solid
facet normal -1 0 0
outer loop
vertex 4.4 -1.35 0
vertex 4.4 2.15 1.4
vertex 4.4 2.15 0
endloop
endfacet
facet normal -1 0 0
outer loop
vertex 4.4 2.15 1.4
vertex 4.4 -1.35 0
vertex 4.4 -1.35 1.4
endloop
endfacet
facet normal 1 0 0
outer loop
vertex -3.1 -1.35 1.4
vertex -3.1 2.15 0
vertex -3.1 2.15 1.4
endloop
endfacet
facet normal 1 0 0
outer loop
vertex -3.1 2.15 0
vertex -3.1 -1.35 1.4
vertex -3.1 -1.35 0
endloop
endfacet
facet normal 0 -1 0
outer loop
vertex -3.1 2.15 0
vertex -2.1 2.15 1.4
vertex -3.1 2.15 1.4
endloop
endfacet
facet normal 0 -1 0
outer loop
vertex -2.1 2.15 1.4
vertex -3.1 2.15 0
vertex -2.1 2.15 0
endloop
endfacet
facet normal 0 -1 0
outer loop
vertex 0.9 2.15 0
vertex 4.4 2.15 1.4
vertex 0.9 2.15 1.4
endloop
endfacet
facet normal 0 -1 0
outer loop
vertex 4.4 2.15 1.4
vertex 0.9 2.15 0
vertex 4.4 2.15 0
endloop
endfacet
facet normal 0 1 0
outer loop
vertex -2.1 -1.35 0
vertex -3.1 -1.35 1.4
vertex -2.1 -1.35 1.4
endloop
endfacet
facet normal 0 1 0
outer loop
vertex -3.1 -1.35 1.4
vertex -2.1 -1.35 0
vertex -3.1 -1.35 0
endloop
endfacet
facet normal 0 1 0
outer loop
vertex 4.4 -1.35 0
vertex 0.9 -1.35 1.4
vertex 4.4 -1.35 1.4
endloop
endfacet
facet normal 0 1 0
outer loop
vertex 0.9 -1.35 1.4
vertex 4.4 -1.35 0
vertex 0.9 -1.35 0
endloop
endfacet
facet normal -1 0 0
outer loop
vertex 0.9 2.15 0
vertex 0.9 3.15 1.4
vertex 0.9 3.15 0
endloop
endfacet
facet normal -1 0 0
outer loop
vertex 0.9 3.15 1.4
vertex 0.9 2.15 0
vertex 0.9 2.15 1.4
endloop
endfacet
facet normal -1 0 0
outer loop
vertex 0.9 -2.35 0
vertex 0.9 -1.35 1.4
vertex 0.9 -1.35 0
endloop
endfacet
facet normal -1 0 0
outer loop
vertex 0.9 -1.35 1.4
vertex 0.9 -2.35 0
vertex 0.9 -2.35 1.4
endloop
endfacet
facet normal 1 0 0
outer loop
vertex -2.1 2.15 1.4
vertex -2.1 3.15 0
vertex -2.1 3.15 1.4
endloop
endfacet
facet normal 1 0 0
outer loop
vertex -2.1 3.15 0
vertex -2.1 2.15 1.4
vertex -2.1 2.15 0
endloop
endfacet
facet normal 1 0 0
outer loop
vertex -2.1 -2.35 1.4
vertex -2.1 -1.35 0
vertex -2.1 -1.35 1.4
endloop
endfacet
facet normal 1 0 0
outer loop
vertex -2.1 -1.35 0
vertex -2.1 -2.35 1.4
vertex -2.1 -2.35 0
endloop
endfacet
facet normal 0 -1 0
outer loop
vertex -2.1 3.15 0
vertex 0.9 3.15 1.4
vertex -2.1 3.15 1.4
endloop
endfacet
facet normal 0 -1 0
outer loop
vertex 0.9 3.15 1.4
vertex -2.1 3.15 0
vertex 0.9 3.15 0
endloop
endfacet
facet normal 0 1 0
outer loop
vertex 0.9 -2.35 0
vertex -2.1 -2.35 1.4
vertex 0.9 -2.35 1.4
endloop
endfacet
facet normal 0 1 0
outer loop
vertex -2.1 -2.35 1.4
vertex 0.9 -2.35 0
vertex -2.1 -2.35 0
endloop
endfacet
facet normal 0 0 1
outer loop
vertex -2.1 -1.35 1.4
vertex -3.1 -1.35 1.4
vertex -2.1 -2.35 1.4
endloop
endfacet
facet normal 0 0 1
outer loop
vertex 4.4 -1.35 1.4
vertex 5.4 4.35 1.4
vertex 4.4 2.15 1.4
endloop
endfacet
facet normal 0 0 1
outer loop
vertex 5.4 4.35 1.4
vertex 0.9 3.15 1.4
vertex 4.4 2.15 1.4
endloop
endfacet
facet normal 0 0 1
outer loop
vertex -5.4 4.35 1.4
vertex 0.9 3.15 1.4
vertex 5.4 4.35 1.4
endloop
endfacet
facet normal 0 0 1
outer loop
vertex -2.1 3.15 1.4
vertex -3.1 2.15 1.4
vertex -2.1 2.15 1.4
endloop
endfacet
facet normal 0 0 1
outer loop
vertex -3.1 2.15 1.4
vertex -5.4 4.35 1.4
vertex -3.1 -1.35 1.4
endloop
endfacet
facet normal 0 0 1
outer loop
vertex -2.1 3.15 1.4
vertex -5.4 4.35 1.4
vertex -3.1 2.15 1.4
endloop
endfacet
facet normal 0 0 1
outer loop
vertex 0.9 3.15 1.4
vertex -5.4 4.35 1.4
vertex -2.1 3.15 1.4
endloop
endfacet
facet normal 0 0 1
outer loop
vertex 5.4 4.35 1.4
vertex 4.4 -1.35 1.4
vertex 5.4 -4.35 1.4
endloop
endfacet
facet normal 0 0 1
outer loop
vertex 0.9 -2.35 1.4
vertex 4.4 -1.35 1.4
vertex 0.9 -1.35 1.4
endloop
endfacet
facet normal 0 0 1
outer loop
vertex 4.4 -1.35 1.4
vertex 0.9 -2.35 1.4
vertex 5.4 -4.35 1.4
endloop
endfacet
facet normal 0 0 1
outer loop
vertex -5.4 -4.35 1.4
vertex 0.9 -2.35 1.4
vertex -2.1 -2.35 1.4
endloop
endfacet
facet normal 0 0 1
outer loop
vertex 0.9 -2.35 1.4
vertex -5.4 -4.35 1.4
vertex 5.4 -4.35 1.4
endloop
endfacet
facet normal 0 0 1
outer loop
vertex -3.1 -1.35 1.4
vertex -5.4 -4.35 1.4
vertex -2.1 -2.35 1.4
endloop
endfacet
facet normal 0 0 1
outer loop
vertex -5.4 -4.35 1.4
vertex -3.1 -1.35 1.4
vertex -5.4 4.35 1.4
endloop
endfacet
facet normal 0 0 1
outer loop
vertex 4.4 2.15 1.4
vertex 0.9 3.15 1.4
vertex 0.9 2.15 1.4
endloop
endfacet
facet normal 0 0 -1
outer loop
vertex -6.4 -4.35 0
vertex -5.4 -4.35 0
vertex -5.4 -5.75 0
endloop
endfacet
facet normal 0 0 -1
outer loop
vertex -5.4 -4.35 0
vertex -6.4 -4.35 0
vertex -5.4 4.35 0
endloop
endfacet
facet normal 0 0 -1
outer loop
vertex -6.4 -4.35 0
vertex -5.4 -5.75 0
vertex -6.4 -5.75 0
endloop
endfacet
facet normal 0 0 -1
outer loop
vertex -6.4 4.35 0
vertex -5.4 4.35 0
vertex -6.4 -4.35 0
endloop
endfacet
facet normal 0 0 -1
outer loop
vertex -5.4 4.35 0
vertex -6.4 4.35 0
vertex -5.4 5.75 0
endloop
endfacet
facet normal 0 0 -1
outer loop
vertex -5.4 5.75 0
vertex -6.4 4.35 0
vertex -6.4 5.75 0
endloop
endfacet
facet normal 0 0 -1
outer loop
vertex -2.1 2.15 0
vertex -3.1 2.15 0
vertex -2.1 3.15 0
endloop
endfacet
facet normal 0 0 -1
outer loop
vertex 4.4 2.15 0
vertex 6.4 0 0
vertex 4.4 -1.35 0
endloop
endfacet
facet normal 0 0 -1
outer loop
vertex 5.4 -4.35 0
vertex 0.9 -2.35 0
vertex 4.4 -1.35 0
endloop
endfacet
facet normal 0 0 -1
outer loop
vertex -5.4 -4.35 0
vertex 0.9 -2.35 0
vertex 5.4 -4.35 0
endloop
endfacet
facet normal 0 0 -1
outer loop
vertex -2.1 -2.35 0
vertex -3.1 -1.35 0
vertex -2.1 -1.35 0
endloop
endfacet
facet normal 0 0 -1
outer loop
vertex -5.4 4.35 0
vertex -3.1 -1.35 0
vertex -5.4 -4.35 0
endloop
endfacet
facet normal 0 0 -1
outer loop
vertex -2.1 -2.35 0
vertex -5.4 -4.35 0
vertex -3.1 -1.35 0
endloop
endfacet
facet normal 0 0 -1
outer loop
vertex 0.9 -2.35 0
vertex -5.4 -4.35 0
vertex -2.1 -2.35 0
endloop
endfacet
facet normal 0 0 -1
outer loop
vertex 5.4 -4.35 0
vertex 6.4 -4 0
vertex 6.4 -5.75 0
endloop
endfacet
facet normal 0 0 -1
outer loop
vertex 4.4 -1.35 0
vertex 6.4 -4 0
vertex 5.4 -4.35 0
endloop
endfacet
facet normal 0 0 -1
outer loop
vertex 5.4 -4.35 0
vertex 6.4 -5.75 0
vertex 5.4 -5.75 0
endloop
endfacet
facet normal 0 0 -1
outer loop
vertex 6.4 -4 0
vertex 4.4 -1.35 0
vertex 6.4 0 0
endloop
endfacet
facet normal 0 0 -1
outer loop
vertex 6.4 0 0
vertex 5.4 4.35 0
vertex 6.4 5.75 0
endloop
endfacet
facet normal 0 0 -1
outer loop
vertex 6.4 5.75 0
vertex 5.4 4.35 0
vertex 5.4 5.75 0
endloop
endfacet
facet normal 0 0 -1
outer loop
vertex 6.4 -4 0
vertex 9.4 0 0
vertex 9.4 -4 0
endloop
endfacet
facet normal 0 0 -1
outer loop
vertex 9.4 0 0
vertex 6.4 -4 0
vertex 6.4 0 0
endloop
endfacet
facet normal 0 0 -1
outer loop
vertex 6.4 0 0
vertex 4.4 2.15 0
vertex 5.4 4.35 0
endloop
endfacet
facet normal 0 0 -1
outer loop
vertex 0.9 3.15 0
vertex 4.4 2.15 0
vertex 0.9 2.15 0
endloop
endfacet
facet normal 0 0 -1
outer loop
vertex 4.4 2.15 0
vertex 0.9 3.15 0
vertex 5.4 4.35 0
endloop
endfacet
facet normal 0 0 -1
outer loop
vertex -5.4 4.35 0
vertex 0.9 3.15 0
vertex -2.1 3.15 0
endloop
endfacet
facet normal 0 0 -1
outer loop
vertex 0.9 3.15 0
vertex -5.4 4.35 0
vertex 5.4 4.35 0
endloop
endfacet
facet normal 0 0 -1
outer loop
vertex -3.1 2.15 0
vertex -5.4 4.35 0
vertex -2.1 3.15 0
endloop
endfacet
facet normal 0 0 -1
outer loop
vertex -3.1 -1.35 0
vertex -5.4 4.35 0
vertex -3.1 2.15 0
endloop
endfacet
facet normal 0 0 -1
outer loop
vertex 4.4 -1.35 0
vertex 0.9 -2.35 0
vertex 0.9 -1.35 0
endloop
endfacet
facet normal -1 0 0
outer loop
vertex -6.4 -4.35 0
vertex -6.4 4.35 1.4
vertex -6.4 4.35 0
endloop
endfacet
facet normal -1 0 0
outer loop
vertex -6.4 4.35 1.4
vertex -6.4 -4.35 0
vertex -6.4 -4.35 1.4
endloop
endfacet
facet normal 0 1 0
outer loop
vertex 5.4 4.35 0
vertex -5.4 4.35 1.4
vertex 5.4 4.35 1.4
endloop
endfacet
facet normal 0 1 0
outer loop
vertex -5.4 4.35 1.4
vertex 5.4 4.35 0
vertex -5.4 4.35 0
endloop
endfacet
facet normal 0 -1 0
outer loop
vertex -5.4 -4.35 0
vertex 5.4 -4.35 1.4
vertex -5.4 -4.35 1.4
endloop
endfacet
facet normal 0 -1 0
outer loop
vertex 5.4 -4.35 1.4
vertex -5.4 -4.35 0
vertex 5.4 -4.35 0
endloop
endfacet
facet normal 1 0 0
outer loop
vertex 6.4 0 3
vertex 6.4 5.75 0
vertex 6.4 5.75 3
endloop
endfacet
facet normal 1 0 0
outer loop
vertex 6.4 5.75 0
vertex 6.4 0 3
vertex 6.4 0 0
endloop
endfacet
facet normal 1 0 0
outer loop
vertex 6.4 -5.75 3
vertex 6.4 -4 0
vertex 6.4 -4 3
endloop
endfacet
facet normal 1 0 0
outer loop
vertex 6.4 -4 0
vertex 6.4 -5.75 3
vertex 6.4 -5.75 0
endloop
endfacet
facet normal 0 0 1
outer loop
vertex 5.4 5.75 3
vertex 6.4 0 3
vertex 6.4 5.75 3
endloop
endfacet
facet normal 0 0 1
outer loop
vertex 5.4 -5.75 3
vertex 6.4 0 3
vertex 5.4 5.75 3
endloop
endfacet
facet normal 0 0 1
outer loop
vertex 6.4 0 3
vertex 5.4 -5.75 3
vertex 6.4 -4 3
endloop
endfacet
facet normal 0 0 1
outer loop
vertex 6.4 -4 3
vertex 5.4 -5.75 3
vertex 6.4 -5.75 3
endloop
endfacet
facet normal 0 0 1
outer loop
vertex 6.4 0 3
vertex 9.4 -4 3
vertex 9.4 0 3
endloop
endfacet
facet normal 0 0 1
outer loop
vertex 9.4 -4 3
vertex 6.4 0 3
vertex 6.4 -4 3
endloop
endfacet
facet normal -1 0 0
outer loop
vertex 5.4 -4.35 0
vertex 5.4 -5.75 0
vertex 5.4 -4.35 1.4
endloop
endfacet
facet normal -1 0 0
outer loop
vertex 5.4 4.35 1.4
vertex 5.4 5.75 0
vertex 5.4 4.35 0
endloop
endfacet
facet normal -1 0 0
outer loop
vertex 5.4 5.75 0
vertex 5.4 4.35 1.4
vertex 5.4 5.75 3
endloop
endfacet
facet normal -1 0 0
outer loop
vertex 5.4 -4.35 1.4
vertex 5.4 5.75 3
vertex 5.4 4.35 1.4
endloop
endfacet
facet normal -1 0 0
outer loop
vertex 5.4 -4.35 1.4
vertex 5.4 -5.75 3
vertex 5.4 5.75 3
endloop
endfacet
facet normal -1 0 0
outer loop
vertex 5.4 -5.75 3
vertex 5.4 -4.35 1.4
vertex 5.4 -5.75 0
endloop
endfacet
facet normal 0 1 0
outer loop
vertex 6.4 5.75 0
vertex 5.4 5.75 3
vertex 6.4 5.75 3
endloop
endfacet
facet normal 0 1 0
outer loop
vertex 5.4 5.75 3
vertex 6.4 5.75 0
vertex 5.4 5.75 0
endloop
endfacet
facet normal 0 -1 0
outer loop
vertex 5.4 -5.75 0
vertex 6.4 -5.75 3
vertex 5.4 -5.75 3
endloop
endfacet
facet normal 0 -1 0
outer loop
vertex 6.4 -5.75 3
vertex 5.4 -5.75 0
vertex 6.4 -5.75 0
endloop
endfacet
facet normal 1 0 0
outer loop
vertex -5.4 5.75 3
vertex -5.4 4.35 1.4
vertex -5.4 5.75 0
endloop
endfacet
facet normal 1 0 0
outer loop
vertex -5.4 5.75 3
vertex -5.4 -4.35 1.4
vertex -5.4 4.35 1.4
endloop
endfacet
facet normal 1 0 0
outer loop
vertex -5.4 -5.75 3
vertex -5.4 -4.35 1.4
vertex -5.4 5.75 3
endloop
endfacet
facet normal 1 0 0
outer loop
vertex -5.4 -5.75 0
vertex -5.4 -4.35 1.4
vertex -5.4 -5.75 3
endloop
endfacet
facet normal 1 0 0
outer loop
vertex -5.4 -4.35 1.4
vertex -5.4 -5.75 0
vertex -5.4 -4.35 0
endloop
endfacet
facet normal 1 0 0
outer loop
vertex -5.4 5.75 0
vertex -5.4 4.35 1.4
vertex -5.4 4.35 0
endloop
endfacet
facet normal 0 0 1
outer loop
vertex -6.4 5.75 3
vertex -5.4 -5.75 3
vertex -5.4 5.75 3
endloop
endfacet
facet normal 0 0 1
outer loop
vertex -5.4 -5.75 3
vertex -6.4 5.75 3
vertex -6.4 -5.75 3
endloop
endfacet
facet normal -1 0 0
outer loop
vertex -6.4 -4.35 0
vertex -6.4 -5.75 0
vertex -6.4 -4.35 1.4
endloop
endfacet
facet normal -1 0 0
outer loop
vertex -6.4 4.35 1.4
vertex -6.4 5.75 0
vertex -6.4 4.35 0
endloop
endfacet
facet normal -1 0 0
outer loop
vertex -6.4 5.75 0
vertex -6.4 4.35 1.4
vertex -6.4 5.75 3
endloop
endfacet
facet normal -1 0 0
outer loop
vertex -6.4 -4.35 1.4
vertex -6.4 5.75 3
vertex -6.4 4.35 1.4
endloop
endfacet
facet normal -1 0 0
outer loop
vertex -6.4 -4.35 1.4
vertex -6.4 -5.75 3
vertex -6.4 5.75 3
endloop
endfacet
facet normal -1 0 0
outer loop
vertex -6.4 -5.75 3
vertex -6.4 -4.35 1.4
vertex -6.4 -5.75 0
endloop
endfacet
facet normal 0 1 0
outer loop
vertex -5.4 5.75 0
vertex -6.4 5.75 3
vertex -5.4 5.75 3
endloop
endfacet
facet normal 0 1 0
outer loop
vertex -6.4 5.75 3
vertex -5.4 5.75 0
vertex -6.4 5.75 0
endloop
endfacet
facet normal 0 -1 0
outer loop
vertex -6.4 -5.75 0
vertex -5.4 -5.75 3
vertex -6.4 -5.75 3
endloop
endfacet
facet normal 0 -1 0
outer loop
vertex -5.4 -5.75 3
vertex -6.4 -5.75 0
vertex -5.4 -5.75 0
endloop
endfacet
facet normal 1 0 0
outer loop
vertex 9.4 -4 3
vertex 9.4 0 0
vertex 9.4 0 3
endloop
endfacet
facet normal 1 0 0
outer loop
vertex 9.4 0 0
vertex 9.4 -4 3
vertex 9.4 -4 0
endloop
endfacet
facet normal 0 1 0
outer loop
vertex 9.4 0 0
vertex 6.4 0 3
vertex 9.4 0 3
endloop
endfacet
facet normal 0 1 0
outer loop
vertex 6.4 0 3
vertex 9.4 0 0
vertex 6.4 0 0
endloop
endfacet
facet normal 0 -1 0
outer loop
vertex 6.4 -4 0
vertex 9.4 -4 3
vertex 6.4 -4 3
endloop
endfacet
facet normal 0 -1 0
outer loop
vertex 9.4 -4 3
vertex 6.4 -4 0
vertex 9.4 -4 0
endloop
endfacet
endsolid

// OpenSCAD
$fa=1;
$fs=0.5;

centralPlateLength = 12.8;
centralPlateWidth = 8.7;

yBarWidth = 1 ;
yBarLength = 11.5 ;

lockingPinLength = 3;
lockingPinWidth = 4 ;
lockingPinHeight = 3 ;

module centralPlate () {
  module crossHole () {
    union () {
      cube ([7.5,3.5,4]) ;
      translate ([1.,-1,0]) {
        cube ([3,5.5,4]) ;
      }
    }
  }
  module plate() {
    cube ([centralPlateLength,centralPlateWidth,1.4]);
  }
  // combine
  translate ([-centralPlateLength/2,-centralPlateWidth/2,0]) {
    difference () {
      union () {
        plate () ;
      }
      union () {
        translate ([3.3,3,-1])
          crossHole ();
      }
    }
  }
}


module yBar () {
  translate ([0,-yBarLength/2,0]) {
    cube ([yBarWidth,yBarLength,3]) ;
  }
}
module frontBar () {
  translate ([centralPlateLength/2-yBarWidth,0,0]) {
    yBar() ;
  }
}
module rearBar () {
  translate ([-centralPlateLength/2,,0]) {
    yBar() ;
  }
}

module lockingPin () {
translate ([centralPlateLength/2-yBarWidth,-lockingPinWidth,0]) {
  cube ([lockingPinLength+1,lockingPinWidth,lockingPinHeight]);
}
}

module batteryLock () {
  union () {
    centralPlate ();
    frontBar();
    rearBar() ;
    lockingPin ();
  }
}

batteryLock () ;
